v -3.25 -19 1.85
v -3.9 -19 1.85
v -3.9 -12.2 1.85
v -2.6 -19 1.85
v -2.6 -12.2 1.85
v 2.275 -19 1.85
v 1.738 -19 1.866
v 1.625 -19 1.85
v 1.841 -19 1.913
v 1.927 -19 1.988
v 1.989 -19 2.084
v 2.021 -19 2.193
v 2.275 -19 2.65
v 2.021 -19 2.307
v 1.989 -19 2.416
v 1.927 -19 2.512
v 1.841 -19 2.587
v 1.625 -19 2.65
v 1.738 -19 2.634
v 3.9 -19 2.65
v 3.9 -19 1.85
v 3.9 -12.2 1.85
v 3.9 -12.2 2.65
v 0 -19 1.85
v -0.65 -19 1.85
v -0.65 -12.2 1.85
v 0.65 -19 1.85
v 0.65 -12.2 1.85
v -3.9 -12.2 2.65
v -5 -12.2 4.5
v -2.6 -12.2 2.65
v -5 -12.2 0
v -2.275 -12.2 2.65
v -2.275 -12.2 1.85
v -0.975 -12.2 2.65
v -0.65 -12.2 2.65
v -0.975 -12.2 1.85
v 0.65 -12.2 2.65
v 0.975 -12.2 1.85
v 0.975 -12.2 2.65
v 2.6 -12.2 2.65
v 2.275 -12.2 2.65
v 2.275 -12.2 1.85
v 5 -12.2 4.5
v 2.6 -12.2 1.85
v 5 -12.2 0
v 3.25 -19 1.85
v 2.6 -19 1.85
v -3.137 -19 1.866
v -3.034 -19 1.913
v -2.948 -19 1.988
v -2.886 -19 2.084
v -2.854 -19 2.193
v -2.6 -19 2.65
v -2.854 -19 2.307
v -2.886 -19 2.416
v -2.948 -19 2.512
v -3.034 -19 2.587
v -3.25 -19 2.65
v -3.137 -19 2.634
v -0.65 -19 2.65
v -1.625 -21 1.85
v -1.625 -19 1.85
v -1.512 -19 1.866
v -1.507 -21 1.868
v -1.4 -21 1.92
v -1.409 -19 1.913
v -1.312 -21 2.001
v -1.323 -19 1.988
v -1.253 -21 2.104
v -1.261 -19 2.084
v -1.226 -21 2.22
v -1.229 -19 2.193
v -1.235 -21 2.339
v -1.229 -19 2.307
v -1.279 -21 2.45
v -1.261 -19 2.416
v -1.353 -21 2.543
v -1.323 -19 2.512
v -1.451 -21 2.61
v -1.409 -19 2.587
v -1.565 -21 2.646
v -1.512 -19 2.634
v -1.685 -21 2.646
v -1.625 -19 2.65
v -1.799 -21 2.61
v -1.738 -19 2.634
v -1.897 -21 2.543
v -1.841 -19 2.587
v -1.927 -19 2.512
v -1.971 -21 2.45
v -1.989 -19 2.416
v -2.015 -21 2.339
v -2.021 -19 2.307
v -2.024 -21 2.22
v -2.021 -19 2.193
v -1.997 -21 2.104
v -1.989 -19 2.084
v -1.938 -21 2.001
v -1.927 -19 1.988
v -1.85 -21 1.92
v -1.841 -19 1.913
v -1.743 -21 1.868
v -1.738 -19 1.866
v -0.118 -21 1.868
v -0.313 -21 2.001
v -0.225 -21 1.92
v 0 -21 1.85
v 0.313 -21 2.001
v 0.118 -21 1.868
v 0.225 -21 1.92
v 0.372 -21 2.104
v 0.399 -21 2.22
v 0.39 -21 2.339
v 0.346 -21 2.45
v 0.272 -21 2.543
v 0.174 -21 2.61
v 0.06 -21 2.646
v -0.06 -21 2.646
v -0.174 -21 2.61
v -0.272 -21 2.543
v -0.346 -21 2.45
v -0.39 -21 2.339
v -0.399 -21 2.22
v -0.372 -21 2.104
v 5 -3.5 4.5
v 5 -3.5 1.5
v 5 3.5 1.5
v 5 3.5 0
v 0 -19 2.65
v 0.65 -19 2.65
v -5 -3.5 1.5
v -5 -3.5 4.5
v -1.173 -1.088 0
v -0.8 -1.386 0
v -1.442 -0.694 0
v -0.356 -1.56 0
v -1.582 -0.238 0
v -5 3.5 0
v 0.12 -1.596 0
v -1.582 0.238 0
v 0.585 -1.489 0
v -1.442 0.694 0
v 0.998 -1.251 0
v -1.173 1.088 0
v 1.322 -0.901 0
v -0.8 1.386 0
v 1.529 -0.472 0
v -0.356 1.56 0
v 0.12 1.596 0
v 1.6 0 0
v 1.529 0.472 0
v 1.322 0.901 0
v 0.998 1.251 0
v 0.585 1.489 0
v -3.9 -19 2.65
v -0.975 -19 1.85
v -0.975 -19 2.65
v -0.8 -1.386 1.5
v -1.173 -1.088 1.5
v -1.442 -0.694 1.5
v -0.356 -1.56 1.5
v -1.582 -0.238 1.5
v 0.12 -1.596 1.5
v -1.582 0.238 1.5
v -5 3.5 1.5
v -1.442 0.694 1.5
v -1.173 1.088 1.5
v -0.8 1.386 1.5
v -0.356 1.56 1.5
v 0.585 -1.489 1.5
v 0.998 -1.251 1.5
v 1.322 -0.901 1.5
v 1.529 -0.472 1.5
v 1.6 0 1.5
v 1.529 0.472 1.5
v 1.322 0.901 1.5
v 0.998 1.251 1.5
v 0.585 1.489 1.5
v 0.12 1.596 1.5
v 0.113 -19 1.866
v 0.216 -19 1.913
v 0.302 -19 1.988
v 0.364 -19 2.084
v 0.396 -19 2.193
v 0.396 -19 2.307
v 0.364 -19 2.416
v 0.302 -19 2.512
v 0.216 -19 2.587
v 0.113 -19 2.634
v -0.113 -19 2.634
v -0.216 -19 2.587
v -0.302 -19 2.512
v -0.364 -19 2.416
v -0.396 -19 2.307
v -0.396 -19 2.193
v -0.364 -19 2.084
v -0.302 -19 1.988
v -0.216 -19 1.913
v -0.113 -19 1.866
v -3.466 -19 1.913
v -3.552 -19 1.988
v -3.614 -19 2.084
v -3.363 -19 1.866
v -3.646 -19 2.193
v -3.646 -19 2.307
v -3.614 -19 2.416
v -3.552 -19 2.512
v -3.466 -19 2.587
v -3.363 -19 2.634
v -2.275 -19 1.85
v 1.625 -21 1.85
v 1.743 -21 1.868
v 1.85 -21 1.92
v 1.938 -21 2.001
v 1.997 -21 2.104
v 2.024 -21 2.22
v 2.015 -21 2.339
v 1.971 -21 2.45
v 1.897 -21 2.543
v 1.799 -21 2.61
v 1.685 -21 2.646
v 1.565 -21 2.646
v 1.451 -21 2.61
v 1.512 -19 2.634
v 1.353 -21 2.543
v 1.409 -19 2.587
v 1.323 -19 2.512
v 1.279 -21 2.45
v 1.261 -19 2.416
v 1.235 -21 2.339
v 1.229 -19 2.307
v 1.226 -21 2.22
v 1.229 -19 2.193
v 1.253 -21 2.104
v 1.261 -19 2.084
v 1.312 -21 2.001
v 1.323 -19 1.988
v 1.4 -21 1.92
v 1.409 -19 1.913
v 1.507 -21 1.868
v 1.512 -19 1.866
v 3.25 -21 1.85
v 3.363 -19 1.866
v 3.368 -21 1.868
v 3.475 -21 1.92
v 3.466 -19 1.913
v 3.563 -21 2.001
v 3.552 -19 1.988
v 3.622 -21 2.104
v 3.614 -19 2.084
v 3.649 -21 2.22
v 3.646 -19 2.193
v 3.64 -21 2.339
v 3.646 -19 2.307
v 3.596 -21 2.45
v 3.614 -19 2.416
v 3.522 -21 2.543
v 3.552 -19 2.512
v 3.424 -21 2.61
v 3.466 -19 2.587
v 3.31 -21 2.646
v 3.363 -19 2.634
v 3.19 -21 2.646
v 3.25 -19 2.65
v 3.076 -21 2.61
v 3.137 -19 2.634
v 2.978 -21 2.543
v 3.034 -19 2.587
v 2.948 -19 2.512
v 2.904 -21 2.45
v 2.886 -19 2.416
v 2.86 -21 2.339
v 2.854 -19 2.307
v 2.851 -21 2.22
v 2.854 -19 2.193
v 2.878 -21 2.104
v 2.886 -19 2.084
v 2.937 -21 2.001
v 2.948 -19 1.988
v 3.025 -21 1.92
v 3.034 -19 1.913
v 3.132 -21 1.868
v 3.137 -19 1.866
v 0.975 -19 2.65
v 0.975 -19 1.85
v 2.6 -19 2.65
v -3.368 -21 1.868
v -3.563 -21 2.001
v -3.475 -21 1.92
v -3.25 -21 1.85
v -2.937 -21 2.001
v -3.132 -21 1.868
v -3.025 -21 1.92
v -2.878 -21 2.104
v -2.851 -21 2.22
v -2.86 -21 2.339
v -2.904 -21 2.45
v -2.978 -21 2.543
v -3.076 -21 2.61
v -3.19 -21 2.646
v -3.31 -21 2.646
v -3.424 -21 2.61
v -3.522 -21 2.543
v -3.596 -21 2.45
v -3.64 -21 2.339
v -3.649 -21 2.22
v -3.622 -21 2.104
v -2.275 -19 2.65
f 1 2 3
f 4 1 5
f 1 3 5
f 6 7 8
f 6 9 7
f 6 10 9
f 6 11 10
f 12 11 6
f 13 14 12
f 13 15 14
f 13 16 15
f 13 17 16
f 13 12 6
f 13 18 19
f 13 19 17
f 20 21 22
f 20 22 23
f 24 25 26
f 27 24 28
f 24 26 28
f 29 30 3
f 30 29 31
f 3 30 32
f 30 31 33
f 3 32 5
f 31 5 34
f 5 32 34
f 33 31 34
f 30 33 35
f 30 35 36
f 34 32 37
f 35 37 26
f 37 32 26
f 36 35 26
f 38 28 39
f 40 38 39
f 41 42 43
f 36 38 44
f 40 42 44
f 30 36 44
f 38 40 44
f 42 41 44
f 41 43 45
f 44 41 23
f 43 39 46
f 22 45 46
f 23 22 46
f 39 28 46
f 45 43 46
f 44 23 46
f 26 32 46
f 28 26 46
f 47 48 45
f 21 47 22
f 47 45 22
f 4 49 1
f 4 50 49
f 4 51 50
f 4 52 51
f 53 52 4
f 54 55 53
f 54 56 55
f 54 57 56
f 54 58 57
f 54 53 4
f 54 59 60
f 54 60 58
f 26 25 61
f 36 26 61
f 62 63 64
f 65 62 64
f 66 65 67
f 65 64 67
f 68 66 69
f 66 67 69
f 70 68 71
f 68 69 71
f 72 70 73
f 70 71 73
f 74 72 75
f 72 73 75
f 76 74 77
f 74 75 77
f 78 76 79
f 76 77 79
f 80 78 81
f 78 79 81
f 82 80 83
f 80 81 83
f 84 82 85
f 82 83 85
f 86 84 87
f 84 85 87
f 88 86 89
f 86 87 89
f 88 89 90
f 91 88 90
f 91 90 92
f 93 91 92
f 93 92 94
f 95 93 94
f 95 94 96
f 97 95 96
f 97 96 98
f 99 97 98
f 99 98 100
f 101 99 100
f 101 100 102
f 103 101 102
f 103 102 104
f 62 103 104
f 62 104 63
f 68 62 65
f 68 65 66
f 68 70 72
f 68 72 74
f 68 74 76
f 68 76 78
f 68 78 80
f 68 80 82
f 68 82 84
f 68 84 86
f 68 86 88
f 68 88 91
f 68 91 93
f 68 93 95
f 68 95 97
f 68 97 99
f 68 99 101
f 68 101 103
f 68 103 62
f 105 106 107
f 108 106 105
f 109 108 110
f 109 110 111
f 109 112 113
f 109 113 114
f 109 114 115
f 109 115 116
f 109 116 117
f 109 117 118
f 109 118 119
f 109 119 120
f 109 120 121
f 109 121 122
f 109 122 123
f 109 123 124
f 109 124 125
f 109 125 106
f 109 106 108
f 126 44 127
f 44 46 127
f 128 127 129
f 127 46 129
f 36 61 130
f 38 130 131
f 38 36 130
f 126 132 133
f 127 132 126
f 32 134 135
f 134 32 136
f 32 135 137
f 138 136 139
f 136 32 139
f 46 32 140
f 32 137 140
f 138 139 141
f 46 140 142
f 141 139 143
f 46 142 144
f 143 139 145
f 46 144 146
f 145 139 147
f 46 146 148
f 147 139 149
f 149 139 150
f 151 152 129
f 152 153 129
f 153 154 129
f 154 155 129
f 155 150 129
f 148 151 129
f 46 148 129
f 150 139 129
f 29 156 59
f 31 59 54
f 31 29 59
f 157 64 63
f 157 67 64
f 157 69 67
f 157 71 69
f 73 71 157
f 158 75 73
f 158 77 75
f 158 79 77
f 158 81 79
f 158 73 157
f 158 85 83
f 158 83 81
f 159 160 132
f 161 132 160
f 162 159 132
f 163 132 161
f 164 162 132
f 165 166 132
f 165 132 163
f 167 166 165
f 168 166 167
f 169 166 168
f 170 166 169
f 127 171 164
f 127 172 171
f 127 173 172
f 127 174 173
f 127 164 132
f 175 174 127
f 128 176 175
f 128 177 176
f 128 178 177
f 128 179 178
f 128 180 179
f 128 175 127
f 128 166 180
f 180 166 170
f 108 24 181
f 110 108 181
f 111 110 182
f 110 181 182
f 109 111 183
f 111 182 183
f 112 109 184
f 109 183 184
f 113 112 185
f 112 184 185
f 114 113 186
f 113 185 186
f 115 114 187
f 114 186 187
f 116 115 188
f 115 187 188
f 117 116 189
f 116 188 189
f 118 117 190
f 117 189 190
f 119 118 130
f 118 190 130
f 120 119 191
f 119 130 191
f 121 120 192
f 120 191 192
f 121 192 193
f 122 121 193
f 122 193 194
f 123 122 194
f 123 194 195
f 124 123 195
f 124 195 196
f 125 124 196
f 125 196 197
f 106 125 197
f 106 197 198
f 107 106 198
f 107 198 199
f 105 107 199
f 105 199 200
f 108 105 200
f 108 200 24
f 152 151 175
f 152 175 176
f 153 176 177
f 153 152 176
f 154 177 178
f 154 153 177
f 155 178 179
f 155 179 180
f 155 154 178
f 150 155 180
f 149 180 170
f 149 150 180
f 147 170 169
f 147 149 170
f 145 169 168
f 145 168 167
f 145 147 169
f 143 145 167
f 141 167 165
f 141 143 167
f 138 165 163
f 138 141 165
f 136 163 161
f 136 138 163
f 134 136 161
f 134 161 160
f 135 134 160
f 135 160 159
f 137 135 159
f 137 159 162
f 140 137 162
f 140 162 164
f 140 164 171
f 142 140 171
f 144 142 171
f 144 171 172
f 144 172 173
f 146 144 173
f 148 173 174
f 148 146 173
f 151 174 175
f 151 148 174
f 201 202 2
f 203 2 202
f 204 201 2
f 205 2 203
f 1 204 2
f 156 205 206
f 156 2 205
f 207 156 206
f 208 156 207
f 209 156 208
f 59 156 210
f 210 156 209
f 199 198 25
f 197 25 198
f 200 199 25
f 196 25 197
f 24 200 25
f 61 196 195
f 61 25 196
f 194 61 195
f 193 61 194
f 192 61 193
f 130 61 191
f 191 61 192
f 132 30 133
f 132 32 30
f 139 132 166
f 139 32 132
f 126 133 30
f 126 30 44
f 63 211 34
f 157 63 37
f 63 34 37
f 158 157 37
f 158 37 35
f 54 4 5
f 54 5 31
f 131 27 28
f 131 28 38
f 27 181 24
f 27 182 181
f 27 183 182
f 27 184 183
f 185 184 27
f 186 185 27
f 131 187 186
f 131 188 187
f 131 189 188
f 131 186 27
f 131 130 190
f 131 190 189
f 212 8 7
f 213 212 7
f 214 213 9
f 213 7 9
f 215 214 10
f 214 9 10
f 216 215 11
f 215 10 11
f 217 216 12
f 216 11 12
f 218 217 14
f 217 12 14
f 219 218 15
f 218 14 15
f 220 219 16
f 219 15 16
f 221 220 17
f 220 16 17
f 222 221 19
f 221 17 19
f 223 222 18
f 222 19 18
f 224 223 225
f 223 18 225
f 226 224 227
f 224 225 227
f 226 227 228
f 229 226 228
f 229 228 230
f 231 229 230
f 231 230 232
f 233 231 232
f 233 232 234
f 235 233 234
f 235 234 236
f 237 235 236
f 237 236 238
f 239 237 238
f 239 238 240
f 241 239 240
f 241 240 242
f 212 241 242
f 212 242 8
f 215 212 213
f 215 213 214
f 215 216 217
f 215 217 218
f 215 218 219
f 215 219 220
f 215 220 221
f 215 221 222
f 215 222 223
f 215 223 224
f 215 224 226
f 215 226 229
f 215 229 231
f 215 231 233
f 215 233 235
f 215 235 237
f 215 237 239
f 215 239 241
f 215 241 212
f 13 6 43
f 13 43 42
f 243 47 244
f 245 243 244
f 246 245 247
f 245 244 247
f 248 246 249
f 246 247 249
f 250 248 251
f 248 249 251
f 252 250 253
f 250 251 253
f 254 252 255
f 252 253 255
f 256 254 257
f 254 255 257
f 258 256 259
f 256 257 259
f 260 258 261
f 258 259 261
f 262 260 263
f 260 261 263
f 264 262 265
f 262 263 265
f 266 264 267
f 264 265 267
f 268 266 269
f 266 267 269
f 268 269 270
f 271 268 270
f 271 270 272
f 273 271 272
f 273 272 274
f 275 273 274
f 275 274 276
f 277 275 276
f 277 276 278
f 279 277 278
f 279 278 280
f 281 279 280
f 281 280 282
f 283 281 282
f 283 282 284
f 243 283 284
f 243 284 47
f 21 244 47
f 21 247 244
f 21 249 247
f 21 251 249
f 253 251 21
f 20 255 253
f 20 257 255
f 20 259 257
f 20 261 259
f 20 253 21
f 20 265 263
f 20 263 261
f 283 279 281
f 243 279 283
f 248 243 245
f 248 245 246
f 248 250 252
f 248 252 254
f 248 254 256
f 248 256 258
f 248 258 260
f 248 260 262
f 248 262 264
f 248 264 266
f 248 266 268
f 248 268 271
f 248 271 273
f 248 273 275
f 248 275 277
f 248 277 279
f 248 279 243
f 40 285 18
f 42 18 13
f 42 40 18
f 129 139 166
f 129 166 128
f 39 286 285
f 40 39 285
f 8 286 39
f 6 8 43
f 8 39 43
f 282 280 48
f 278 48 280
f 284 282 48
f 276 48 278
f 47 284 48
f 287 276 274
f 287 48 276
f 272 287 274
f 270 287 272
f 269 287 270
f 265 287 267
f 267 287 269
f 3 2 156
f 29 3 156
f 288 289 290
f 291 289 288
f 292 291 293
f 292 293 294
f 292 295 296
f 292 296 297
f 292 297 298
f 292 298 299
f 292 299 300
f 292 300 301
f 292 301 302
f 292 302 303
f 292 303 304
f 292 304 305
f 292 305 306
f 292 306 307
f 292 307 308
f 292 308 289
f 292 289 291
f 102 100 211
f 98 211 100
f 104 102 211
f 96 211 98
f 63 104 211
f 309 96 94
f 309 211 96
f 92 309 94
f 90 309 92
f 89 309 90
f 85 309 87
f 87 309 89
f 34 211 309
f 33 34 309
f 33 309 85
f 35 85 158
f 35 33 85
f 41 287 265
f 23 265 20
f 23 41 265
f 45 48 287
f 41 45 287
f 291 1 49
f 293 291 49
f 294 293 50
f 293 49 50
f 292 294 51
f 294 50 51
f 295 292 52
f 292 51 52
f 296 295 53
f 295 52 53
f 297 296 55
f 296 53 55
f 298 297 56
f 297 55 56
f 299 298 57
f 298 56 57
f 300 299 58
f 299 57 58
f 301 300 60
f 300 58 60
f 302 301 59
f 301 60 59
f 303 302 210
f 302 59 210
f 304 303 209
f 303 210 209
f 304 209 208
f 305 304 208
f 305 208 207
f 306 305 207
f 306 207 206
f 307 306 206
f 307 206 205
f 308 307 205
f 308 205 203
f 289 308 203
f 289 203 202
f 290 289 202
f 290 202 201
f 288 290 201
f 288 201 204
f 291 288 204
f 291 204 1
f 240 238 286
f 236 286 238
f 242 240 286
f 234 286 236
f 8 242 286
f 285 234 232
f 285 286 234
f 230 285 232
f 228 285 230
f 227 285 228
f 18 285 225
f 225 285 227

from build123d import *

# Parameters (mm, degrees)
SKETCH1_W           = 10
SKETCH1_H           = 15.7
SKETCH1_R           = 1.6
BOSS_EXTRUDE1_DEPTH = 1.5
SKETCH2_W           = 10
SKETCH2_H           = 8.7
BOSS_EXTRUDE2_DEPTH = 3
SKETCH4_W           = 1.3
SKETCH4_H           = 0.8
BOSS_EXTRUDE3_DEPTH = 6.8
SKETCH5_R           = 0.4
BOSS_EXTRUDE4_DEPTH = 2


with BuildPart() as part:
    # Sketch1 → Boss-Extrude1 (new body)
    with BuildSketch(Plane.XY):
        with Locations((0, -4.35)):
            Rectangle(SKETCH1_W, SKETCH1_H)
        Circle(SKETCH1_R, mode=Mode.SUBTRACT)
    extrude(amount=BOSS_EXTRUDE1_DEPTH)

    # Sketch2 → Boss-Extrude2 (add)
    with BuildSketch(Plane.XY.offset(1.5)):
        with Locations((0, -7.85)):
            Rectangle(SKETCH2_W, SKETCH2_H)
    extrude(amount=BOSS_EXTRUDE2_DEPTH)

    # Sketch4 → Boss-Extrude3 (add)
    with BuildSketch(Plane.XZ.offset(12.2)):
        with Locations((-3.25, 2.25)):
            Rectangle(SKETCH4_W, SKETCH4_H)
        with Locations((-1.625, 2.25)):
            Rectangle(SKETCH4_W, SKETCH4_H)
        with Locations((0, 2.25)):
            Rectangle(SKETCH4_W, SKETCH4_H)
        with Locations((1.625, 2.25)):
            Rectangle(SKETCH4_W, SKETCH4_H)
        with Locations((3.25, 2.25)):
            Rectangle(SKETCH4_W, SKETCH4_H)
    extrude(amount=BOSS_EXTRUDE3_DEPTH)

    # Sketch5 → Boss-Extrude4 (add)
    with BuildSketch(Plane.XZ.offset(19)):
        with Locations(Location((-3.25, 2.25, 0), (0, 0, 270))):
            Circle(SKETCH5_R)
        with Locations(Location((-1.625, 2.25, 0), (0, 0, 270))):
            Circle(SKETCH5_R)
        with Locations(Location((0, 2.25, 0), (0, 0, 270))):
            Circle(SKETCH5_R)
        with Locations(Location((1.625, 2.25, 0), (0, 0, 270))):
            Circle(SKETCH5_R)
        with Locations(Location((3.25, 2.25, 0), (0, 0, 270))):
            Circle(SKETCH5_R)
    extrude(amount=BOSS_EXTRUDE4_DEPTH)


solid = part.part
